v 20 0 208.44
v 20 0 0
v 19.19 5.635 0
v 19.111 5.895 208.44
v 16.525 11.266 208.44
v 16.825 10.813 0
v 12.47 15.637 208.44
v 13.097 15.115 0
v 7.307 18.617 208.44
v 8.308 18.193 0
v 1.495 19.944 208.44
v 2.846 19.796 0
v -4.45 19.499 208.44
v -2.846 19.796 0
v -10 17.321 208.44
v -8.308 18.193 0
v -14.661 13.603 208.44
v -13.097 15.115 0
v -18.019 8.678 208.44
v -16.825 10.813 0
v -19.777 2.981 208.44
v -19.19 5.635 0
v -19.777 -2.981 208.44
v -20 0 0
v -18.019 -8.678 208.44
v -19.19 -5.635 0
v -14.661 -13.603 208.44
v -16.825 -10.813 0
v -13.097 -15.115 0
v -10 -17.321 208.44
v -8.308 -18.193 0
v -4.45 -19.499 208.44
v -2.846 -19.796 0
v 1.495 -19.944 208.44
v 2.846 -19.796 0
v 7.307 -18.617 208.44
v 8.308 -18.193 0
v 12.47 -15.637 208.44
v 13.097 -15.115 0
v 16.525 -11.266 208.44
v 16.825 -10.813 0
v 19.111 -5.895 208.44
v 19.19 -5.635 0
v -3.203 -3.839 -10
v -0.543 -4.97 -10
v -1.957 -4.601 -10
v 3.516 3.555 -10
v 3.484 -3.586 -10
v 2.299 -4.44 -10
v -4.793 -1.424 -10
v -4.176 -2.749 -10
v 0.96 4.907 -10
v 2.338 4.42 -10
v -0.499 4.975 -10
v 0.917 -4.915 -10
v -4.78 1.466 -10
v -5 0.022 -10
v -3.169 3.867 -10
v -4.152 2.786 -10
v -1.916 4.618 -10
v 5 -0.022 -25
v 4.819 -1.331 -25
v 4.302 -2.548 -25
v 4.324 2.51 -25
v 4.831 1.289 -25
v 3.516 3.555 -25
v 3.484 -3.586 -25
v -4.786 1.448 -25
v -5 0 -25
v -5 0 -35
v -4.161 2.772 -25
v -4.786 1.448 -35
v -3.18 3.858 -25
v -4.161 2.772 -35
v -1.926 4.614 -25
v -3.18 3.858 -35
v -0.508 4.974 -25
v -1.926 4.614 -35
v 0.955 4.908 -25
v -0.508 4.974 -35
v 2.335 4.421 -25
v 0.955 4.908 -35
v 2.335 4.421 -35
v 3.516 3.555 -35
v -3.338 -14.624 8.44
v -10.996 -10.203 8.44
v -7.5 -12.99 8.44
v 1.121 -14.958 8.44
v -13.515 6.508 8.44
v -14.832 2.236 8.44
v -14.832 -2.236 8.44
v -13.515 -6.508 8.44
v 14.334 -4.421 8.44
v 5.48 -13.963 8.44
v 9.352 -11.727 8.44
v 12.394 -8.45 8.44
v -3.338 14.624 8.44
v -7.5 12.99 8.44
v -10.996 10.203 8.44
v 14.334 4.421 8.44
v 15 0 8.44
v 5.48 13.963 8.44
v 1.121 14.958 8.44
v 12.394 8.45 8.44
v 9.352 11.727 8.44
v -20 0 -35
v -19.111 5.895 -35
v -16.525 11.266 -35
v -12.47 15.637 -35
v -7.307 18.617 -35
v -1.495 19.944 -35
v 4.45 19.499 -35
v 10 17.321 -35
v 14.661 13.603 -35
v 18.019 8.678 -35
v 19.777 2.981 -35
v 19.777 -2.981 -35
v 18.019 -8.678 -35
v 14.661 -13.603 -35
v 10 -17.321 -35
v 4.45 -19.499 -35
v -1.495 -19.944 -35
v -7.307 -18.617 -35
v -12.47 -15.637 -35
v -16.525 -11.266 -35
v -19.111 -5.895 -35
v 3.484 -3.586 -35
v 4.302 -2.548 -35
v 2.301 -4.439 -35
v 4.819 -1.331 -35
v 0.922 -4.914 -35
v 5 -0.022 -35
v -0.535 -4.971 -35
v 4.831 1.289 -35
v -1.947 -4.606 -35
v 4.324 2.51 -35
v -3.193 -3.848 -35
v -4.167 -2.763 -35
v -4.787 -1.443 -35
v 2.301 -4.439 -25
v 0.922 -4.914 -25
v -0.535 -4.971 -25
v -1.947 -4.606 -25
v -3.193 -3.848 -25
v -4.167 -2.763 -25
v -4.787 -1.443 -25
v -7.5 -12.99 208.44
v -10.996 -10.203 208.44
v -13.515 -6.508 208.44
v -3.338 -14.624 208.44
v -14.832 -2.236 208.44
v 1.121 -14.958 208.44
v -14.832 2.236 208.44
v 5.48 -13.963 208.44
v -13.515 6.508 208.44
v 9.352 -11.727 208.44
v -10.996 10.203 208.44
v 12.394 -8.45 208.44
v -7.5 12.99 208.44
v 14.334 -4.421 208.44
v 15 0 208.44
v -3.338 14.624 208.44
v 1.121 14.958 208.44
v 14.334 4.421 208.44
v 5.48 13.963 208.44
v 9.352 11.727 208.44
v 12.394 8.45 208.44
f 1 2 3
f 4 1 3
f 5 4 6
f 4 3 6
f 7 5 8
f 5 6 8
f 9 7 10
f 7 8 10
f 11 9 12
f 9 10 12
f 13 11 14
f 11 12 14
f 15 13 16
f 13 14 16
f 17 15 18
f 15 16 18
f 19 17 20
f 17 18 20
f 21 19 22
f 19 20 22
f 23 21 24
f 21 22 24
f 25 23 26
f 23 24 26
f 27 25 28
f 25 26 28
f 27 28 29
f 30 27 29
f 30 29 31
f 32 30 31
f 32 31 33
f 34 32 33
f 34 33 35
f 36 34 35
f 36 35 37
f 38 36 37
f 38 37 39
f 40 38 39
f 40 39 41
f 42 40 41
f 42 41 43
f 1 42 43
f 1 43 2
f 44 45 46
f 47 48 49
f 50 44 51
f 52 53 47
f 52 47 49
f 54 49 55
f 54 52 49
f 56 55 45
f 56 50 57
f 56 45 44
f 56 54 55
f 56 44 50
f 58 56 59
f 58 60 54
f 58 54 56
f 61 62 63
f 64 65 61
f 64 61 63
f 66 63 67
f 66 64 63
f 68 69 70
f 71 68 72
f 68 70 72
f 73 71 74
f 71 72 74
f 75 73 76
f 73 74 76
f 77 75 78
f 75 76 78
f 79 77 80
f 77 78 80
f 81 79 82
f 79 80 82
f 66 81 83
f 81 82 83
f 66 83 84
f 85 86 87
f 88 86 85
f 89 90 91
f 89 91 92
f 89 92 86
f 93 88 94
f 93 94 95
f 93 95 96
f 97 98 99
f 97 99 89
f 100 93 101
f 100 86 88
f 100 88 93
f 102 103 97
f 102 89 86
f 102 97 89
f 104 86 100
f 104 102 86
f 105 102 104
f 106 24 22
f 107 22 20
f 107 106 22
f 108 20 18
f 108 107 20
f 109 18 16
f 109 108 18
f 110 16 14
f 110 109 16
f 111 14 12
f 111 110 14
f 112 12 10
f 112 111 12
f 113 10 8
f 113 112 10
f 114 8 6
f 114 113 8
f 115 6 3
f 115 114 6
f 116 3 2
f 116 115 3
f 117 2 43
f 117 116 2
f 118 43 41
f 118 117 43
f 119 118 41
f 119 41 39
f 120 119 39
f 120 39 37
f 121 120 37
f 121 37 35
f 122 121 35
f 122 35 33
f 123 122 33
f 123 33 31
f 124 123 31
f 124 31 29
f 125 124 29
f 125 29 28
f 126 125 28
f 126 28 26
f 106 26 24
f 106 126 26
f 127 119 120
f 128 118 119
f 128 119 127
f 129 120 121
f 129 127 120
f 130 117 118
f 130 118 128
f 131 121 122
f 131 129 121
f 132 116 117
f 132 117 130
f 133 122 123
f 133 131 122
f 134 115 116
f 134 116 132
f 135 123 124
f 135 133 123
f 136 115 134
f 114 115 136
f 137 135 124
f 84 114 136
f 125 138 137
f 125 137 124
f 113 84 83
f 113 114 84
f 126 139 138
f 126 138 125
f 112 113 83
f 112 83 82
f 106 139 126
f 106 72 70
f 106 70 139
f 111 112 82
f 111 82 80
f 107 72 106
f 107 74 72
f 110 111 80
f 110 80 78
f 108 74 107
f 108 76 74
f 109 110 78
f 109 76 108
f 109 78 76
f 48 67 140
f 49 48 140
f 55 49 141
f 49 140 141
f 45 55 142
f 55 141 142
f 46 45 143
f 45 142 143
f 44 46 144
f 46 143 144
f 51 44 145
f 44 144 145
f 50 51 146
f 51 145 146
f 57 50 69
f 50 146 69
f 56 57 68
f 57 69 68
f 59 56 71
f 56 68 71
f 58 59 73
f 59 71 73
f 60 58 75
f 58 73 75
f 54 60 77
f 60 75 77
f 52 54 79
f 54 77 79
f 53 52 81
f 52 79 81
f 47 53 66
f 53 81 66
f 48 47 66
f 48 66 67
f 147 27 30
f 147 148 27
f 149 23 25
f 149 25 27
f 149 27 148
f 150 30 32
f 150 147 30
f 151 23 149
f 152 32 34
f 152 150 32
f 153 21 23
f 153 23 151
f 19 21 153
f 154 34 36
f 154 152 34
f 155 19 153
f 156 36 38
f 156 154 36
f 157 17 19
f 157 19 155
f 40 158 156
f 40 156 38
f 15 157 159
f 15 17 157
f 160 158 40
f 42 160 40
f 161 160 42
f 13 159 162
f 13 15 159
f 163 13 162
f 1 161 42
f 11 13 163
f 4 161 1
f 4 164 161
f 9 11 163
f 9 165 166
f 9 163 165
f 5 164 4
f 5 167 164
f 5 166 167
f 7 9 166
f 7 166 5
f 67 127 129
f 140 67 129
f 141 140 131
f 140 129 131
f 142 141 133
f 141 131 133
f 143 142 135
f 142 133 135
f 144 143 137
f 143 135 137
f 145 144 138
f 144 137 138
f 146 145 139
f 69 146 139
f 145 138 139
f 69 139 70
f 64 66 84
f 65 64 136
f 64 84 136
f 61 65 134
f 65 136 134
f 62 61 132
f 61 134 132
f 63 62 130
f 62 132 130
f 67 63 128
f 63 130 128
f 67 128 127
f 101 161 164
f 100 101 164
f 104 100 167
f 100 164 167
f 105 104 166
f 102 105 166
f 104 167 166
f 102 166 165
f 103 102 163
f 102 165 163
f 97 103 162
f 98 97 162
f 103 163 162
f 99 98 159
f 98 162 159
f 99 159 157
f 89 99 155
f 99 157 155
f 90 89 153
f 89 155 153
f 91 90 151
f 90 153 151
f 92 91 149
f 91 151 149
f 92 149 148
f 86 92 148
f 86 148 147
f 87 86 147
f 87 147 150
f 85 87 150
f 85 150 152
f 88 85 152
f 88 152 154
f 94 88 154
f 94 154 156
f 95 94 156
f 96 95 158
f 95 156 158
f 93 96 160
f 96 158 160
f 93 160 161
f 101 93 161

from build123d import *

# Parameters (mm, degrees)
SKETCH_1_R          = 20
EXTRUDE_1_DEPTH     = 208.44
EXTRUDE_START       = 35
SKETCH_3_R          = 20
EXTRUDE_2_DEPTH     = 35
CUT_EXTRUDE_1_DEPTH = 25
SKETCH_5_R          = 5
CUT_EXTRUDE_2_DEPTH = 10
SKETCH_6_R          = 15
CUT_EXTRUDE_3_DEPTH = 200


with BuildPart() as part:
    # 스케치1 → 보스-돌출1 (new body)
    with BuildSketch(Plane.XY):
        Circle(SKETCH_1_R)
    extrude(amount=EXTRUDE_1_DEPTH)

    # 스케치3 → 보스-돌출2 (add)
    with BuildSketch(Plane(origin=(0, 0, 0), x_dir=(-1, 0, 0), z_dir=(0, 0, -1)).offset(EXTRUDE_START)):
        Circle(SKETCH_3_R)
    extrude(amount=-EXTRUDE_2_DEPTH)

    # 스케치4 → 컷-돌출1 (cut)
    with BuildSketch(Plane(origin=(0, 0, -35), x_dir=(-1, 0, 0), z_dir=(0, 0, -1))):
        with BuildLine():
            Line((-3.515670801, 3.555286039), (-3.484261495, -3.586073317))
            ThreePointArc((-3.484261495, -3.586073317), (4.99995164, 0.021990913), (-3.515670801, 3.555286039))
        make_face()
    extrude(amount=-CUT_EXTRUDE_1_DEPTH, mode=Mode.SUBTRACT)

    # 스케치5 → 컷-돌출2 (cut)
    with BuildSketch(Plane(origin=(0, 0, -35), x_dir=(-1, 0, 0), z_dir=(0, 0, -1))):
        Circle(SKETCH_5_R)
    extrude(amount=-CUT_EXTRUDE_2_DEPTH, mode=Mode.SUBTRACT)

    # 스케치6 → 컷-돌출3 (cut)
    with BuildSketch(Plane.XY.offset(208.44)):
        Circle(SKETCH_6_R)
    extrude(amount=-CUT_EXTRUDE_3_DEPTH, mode=Mode.SUBTRACT)


solid = part.part
